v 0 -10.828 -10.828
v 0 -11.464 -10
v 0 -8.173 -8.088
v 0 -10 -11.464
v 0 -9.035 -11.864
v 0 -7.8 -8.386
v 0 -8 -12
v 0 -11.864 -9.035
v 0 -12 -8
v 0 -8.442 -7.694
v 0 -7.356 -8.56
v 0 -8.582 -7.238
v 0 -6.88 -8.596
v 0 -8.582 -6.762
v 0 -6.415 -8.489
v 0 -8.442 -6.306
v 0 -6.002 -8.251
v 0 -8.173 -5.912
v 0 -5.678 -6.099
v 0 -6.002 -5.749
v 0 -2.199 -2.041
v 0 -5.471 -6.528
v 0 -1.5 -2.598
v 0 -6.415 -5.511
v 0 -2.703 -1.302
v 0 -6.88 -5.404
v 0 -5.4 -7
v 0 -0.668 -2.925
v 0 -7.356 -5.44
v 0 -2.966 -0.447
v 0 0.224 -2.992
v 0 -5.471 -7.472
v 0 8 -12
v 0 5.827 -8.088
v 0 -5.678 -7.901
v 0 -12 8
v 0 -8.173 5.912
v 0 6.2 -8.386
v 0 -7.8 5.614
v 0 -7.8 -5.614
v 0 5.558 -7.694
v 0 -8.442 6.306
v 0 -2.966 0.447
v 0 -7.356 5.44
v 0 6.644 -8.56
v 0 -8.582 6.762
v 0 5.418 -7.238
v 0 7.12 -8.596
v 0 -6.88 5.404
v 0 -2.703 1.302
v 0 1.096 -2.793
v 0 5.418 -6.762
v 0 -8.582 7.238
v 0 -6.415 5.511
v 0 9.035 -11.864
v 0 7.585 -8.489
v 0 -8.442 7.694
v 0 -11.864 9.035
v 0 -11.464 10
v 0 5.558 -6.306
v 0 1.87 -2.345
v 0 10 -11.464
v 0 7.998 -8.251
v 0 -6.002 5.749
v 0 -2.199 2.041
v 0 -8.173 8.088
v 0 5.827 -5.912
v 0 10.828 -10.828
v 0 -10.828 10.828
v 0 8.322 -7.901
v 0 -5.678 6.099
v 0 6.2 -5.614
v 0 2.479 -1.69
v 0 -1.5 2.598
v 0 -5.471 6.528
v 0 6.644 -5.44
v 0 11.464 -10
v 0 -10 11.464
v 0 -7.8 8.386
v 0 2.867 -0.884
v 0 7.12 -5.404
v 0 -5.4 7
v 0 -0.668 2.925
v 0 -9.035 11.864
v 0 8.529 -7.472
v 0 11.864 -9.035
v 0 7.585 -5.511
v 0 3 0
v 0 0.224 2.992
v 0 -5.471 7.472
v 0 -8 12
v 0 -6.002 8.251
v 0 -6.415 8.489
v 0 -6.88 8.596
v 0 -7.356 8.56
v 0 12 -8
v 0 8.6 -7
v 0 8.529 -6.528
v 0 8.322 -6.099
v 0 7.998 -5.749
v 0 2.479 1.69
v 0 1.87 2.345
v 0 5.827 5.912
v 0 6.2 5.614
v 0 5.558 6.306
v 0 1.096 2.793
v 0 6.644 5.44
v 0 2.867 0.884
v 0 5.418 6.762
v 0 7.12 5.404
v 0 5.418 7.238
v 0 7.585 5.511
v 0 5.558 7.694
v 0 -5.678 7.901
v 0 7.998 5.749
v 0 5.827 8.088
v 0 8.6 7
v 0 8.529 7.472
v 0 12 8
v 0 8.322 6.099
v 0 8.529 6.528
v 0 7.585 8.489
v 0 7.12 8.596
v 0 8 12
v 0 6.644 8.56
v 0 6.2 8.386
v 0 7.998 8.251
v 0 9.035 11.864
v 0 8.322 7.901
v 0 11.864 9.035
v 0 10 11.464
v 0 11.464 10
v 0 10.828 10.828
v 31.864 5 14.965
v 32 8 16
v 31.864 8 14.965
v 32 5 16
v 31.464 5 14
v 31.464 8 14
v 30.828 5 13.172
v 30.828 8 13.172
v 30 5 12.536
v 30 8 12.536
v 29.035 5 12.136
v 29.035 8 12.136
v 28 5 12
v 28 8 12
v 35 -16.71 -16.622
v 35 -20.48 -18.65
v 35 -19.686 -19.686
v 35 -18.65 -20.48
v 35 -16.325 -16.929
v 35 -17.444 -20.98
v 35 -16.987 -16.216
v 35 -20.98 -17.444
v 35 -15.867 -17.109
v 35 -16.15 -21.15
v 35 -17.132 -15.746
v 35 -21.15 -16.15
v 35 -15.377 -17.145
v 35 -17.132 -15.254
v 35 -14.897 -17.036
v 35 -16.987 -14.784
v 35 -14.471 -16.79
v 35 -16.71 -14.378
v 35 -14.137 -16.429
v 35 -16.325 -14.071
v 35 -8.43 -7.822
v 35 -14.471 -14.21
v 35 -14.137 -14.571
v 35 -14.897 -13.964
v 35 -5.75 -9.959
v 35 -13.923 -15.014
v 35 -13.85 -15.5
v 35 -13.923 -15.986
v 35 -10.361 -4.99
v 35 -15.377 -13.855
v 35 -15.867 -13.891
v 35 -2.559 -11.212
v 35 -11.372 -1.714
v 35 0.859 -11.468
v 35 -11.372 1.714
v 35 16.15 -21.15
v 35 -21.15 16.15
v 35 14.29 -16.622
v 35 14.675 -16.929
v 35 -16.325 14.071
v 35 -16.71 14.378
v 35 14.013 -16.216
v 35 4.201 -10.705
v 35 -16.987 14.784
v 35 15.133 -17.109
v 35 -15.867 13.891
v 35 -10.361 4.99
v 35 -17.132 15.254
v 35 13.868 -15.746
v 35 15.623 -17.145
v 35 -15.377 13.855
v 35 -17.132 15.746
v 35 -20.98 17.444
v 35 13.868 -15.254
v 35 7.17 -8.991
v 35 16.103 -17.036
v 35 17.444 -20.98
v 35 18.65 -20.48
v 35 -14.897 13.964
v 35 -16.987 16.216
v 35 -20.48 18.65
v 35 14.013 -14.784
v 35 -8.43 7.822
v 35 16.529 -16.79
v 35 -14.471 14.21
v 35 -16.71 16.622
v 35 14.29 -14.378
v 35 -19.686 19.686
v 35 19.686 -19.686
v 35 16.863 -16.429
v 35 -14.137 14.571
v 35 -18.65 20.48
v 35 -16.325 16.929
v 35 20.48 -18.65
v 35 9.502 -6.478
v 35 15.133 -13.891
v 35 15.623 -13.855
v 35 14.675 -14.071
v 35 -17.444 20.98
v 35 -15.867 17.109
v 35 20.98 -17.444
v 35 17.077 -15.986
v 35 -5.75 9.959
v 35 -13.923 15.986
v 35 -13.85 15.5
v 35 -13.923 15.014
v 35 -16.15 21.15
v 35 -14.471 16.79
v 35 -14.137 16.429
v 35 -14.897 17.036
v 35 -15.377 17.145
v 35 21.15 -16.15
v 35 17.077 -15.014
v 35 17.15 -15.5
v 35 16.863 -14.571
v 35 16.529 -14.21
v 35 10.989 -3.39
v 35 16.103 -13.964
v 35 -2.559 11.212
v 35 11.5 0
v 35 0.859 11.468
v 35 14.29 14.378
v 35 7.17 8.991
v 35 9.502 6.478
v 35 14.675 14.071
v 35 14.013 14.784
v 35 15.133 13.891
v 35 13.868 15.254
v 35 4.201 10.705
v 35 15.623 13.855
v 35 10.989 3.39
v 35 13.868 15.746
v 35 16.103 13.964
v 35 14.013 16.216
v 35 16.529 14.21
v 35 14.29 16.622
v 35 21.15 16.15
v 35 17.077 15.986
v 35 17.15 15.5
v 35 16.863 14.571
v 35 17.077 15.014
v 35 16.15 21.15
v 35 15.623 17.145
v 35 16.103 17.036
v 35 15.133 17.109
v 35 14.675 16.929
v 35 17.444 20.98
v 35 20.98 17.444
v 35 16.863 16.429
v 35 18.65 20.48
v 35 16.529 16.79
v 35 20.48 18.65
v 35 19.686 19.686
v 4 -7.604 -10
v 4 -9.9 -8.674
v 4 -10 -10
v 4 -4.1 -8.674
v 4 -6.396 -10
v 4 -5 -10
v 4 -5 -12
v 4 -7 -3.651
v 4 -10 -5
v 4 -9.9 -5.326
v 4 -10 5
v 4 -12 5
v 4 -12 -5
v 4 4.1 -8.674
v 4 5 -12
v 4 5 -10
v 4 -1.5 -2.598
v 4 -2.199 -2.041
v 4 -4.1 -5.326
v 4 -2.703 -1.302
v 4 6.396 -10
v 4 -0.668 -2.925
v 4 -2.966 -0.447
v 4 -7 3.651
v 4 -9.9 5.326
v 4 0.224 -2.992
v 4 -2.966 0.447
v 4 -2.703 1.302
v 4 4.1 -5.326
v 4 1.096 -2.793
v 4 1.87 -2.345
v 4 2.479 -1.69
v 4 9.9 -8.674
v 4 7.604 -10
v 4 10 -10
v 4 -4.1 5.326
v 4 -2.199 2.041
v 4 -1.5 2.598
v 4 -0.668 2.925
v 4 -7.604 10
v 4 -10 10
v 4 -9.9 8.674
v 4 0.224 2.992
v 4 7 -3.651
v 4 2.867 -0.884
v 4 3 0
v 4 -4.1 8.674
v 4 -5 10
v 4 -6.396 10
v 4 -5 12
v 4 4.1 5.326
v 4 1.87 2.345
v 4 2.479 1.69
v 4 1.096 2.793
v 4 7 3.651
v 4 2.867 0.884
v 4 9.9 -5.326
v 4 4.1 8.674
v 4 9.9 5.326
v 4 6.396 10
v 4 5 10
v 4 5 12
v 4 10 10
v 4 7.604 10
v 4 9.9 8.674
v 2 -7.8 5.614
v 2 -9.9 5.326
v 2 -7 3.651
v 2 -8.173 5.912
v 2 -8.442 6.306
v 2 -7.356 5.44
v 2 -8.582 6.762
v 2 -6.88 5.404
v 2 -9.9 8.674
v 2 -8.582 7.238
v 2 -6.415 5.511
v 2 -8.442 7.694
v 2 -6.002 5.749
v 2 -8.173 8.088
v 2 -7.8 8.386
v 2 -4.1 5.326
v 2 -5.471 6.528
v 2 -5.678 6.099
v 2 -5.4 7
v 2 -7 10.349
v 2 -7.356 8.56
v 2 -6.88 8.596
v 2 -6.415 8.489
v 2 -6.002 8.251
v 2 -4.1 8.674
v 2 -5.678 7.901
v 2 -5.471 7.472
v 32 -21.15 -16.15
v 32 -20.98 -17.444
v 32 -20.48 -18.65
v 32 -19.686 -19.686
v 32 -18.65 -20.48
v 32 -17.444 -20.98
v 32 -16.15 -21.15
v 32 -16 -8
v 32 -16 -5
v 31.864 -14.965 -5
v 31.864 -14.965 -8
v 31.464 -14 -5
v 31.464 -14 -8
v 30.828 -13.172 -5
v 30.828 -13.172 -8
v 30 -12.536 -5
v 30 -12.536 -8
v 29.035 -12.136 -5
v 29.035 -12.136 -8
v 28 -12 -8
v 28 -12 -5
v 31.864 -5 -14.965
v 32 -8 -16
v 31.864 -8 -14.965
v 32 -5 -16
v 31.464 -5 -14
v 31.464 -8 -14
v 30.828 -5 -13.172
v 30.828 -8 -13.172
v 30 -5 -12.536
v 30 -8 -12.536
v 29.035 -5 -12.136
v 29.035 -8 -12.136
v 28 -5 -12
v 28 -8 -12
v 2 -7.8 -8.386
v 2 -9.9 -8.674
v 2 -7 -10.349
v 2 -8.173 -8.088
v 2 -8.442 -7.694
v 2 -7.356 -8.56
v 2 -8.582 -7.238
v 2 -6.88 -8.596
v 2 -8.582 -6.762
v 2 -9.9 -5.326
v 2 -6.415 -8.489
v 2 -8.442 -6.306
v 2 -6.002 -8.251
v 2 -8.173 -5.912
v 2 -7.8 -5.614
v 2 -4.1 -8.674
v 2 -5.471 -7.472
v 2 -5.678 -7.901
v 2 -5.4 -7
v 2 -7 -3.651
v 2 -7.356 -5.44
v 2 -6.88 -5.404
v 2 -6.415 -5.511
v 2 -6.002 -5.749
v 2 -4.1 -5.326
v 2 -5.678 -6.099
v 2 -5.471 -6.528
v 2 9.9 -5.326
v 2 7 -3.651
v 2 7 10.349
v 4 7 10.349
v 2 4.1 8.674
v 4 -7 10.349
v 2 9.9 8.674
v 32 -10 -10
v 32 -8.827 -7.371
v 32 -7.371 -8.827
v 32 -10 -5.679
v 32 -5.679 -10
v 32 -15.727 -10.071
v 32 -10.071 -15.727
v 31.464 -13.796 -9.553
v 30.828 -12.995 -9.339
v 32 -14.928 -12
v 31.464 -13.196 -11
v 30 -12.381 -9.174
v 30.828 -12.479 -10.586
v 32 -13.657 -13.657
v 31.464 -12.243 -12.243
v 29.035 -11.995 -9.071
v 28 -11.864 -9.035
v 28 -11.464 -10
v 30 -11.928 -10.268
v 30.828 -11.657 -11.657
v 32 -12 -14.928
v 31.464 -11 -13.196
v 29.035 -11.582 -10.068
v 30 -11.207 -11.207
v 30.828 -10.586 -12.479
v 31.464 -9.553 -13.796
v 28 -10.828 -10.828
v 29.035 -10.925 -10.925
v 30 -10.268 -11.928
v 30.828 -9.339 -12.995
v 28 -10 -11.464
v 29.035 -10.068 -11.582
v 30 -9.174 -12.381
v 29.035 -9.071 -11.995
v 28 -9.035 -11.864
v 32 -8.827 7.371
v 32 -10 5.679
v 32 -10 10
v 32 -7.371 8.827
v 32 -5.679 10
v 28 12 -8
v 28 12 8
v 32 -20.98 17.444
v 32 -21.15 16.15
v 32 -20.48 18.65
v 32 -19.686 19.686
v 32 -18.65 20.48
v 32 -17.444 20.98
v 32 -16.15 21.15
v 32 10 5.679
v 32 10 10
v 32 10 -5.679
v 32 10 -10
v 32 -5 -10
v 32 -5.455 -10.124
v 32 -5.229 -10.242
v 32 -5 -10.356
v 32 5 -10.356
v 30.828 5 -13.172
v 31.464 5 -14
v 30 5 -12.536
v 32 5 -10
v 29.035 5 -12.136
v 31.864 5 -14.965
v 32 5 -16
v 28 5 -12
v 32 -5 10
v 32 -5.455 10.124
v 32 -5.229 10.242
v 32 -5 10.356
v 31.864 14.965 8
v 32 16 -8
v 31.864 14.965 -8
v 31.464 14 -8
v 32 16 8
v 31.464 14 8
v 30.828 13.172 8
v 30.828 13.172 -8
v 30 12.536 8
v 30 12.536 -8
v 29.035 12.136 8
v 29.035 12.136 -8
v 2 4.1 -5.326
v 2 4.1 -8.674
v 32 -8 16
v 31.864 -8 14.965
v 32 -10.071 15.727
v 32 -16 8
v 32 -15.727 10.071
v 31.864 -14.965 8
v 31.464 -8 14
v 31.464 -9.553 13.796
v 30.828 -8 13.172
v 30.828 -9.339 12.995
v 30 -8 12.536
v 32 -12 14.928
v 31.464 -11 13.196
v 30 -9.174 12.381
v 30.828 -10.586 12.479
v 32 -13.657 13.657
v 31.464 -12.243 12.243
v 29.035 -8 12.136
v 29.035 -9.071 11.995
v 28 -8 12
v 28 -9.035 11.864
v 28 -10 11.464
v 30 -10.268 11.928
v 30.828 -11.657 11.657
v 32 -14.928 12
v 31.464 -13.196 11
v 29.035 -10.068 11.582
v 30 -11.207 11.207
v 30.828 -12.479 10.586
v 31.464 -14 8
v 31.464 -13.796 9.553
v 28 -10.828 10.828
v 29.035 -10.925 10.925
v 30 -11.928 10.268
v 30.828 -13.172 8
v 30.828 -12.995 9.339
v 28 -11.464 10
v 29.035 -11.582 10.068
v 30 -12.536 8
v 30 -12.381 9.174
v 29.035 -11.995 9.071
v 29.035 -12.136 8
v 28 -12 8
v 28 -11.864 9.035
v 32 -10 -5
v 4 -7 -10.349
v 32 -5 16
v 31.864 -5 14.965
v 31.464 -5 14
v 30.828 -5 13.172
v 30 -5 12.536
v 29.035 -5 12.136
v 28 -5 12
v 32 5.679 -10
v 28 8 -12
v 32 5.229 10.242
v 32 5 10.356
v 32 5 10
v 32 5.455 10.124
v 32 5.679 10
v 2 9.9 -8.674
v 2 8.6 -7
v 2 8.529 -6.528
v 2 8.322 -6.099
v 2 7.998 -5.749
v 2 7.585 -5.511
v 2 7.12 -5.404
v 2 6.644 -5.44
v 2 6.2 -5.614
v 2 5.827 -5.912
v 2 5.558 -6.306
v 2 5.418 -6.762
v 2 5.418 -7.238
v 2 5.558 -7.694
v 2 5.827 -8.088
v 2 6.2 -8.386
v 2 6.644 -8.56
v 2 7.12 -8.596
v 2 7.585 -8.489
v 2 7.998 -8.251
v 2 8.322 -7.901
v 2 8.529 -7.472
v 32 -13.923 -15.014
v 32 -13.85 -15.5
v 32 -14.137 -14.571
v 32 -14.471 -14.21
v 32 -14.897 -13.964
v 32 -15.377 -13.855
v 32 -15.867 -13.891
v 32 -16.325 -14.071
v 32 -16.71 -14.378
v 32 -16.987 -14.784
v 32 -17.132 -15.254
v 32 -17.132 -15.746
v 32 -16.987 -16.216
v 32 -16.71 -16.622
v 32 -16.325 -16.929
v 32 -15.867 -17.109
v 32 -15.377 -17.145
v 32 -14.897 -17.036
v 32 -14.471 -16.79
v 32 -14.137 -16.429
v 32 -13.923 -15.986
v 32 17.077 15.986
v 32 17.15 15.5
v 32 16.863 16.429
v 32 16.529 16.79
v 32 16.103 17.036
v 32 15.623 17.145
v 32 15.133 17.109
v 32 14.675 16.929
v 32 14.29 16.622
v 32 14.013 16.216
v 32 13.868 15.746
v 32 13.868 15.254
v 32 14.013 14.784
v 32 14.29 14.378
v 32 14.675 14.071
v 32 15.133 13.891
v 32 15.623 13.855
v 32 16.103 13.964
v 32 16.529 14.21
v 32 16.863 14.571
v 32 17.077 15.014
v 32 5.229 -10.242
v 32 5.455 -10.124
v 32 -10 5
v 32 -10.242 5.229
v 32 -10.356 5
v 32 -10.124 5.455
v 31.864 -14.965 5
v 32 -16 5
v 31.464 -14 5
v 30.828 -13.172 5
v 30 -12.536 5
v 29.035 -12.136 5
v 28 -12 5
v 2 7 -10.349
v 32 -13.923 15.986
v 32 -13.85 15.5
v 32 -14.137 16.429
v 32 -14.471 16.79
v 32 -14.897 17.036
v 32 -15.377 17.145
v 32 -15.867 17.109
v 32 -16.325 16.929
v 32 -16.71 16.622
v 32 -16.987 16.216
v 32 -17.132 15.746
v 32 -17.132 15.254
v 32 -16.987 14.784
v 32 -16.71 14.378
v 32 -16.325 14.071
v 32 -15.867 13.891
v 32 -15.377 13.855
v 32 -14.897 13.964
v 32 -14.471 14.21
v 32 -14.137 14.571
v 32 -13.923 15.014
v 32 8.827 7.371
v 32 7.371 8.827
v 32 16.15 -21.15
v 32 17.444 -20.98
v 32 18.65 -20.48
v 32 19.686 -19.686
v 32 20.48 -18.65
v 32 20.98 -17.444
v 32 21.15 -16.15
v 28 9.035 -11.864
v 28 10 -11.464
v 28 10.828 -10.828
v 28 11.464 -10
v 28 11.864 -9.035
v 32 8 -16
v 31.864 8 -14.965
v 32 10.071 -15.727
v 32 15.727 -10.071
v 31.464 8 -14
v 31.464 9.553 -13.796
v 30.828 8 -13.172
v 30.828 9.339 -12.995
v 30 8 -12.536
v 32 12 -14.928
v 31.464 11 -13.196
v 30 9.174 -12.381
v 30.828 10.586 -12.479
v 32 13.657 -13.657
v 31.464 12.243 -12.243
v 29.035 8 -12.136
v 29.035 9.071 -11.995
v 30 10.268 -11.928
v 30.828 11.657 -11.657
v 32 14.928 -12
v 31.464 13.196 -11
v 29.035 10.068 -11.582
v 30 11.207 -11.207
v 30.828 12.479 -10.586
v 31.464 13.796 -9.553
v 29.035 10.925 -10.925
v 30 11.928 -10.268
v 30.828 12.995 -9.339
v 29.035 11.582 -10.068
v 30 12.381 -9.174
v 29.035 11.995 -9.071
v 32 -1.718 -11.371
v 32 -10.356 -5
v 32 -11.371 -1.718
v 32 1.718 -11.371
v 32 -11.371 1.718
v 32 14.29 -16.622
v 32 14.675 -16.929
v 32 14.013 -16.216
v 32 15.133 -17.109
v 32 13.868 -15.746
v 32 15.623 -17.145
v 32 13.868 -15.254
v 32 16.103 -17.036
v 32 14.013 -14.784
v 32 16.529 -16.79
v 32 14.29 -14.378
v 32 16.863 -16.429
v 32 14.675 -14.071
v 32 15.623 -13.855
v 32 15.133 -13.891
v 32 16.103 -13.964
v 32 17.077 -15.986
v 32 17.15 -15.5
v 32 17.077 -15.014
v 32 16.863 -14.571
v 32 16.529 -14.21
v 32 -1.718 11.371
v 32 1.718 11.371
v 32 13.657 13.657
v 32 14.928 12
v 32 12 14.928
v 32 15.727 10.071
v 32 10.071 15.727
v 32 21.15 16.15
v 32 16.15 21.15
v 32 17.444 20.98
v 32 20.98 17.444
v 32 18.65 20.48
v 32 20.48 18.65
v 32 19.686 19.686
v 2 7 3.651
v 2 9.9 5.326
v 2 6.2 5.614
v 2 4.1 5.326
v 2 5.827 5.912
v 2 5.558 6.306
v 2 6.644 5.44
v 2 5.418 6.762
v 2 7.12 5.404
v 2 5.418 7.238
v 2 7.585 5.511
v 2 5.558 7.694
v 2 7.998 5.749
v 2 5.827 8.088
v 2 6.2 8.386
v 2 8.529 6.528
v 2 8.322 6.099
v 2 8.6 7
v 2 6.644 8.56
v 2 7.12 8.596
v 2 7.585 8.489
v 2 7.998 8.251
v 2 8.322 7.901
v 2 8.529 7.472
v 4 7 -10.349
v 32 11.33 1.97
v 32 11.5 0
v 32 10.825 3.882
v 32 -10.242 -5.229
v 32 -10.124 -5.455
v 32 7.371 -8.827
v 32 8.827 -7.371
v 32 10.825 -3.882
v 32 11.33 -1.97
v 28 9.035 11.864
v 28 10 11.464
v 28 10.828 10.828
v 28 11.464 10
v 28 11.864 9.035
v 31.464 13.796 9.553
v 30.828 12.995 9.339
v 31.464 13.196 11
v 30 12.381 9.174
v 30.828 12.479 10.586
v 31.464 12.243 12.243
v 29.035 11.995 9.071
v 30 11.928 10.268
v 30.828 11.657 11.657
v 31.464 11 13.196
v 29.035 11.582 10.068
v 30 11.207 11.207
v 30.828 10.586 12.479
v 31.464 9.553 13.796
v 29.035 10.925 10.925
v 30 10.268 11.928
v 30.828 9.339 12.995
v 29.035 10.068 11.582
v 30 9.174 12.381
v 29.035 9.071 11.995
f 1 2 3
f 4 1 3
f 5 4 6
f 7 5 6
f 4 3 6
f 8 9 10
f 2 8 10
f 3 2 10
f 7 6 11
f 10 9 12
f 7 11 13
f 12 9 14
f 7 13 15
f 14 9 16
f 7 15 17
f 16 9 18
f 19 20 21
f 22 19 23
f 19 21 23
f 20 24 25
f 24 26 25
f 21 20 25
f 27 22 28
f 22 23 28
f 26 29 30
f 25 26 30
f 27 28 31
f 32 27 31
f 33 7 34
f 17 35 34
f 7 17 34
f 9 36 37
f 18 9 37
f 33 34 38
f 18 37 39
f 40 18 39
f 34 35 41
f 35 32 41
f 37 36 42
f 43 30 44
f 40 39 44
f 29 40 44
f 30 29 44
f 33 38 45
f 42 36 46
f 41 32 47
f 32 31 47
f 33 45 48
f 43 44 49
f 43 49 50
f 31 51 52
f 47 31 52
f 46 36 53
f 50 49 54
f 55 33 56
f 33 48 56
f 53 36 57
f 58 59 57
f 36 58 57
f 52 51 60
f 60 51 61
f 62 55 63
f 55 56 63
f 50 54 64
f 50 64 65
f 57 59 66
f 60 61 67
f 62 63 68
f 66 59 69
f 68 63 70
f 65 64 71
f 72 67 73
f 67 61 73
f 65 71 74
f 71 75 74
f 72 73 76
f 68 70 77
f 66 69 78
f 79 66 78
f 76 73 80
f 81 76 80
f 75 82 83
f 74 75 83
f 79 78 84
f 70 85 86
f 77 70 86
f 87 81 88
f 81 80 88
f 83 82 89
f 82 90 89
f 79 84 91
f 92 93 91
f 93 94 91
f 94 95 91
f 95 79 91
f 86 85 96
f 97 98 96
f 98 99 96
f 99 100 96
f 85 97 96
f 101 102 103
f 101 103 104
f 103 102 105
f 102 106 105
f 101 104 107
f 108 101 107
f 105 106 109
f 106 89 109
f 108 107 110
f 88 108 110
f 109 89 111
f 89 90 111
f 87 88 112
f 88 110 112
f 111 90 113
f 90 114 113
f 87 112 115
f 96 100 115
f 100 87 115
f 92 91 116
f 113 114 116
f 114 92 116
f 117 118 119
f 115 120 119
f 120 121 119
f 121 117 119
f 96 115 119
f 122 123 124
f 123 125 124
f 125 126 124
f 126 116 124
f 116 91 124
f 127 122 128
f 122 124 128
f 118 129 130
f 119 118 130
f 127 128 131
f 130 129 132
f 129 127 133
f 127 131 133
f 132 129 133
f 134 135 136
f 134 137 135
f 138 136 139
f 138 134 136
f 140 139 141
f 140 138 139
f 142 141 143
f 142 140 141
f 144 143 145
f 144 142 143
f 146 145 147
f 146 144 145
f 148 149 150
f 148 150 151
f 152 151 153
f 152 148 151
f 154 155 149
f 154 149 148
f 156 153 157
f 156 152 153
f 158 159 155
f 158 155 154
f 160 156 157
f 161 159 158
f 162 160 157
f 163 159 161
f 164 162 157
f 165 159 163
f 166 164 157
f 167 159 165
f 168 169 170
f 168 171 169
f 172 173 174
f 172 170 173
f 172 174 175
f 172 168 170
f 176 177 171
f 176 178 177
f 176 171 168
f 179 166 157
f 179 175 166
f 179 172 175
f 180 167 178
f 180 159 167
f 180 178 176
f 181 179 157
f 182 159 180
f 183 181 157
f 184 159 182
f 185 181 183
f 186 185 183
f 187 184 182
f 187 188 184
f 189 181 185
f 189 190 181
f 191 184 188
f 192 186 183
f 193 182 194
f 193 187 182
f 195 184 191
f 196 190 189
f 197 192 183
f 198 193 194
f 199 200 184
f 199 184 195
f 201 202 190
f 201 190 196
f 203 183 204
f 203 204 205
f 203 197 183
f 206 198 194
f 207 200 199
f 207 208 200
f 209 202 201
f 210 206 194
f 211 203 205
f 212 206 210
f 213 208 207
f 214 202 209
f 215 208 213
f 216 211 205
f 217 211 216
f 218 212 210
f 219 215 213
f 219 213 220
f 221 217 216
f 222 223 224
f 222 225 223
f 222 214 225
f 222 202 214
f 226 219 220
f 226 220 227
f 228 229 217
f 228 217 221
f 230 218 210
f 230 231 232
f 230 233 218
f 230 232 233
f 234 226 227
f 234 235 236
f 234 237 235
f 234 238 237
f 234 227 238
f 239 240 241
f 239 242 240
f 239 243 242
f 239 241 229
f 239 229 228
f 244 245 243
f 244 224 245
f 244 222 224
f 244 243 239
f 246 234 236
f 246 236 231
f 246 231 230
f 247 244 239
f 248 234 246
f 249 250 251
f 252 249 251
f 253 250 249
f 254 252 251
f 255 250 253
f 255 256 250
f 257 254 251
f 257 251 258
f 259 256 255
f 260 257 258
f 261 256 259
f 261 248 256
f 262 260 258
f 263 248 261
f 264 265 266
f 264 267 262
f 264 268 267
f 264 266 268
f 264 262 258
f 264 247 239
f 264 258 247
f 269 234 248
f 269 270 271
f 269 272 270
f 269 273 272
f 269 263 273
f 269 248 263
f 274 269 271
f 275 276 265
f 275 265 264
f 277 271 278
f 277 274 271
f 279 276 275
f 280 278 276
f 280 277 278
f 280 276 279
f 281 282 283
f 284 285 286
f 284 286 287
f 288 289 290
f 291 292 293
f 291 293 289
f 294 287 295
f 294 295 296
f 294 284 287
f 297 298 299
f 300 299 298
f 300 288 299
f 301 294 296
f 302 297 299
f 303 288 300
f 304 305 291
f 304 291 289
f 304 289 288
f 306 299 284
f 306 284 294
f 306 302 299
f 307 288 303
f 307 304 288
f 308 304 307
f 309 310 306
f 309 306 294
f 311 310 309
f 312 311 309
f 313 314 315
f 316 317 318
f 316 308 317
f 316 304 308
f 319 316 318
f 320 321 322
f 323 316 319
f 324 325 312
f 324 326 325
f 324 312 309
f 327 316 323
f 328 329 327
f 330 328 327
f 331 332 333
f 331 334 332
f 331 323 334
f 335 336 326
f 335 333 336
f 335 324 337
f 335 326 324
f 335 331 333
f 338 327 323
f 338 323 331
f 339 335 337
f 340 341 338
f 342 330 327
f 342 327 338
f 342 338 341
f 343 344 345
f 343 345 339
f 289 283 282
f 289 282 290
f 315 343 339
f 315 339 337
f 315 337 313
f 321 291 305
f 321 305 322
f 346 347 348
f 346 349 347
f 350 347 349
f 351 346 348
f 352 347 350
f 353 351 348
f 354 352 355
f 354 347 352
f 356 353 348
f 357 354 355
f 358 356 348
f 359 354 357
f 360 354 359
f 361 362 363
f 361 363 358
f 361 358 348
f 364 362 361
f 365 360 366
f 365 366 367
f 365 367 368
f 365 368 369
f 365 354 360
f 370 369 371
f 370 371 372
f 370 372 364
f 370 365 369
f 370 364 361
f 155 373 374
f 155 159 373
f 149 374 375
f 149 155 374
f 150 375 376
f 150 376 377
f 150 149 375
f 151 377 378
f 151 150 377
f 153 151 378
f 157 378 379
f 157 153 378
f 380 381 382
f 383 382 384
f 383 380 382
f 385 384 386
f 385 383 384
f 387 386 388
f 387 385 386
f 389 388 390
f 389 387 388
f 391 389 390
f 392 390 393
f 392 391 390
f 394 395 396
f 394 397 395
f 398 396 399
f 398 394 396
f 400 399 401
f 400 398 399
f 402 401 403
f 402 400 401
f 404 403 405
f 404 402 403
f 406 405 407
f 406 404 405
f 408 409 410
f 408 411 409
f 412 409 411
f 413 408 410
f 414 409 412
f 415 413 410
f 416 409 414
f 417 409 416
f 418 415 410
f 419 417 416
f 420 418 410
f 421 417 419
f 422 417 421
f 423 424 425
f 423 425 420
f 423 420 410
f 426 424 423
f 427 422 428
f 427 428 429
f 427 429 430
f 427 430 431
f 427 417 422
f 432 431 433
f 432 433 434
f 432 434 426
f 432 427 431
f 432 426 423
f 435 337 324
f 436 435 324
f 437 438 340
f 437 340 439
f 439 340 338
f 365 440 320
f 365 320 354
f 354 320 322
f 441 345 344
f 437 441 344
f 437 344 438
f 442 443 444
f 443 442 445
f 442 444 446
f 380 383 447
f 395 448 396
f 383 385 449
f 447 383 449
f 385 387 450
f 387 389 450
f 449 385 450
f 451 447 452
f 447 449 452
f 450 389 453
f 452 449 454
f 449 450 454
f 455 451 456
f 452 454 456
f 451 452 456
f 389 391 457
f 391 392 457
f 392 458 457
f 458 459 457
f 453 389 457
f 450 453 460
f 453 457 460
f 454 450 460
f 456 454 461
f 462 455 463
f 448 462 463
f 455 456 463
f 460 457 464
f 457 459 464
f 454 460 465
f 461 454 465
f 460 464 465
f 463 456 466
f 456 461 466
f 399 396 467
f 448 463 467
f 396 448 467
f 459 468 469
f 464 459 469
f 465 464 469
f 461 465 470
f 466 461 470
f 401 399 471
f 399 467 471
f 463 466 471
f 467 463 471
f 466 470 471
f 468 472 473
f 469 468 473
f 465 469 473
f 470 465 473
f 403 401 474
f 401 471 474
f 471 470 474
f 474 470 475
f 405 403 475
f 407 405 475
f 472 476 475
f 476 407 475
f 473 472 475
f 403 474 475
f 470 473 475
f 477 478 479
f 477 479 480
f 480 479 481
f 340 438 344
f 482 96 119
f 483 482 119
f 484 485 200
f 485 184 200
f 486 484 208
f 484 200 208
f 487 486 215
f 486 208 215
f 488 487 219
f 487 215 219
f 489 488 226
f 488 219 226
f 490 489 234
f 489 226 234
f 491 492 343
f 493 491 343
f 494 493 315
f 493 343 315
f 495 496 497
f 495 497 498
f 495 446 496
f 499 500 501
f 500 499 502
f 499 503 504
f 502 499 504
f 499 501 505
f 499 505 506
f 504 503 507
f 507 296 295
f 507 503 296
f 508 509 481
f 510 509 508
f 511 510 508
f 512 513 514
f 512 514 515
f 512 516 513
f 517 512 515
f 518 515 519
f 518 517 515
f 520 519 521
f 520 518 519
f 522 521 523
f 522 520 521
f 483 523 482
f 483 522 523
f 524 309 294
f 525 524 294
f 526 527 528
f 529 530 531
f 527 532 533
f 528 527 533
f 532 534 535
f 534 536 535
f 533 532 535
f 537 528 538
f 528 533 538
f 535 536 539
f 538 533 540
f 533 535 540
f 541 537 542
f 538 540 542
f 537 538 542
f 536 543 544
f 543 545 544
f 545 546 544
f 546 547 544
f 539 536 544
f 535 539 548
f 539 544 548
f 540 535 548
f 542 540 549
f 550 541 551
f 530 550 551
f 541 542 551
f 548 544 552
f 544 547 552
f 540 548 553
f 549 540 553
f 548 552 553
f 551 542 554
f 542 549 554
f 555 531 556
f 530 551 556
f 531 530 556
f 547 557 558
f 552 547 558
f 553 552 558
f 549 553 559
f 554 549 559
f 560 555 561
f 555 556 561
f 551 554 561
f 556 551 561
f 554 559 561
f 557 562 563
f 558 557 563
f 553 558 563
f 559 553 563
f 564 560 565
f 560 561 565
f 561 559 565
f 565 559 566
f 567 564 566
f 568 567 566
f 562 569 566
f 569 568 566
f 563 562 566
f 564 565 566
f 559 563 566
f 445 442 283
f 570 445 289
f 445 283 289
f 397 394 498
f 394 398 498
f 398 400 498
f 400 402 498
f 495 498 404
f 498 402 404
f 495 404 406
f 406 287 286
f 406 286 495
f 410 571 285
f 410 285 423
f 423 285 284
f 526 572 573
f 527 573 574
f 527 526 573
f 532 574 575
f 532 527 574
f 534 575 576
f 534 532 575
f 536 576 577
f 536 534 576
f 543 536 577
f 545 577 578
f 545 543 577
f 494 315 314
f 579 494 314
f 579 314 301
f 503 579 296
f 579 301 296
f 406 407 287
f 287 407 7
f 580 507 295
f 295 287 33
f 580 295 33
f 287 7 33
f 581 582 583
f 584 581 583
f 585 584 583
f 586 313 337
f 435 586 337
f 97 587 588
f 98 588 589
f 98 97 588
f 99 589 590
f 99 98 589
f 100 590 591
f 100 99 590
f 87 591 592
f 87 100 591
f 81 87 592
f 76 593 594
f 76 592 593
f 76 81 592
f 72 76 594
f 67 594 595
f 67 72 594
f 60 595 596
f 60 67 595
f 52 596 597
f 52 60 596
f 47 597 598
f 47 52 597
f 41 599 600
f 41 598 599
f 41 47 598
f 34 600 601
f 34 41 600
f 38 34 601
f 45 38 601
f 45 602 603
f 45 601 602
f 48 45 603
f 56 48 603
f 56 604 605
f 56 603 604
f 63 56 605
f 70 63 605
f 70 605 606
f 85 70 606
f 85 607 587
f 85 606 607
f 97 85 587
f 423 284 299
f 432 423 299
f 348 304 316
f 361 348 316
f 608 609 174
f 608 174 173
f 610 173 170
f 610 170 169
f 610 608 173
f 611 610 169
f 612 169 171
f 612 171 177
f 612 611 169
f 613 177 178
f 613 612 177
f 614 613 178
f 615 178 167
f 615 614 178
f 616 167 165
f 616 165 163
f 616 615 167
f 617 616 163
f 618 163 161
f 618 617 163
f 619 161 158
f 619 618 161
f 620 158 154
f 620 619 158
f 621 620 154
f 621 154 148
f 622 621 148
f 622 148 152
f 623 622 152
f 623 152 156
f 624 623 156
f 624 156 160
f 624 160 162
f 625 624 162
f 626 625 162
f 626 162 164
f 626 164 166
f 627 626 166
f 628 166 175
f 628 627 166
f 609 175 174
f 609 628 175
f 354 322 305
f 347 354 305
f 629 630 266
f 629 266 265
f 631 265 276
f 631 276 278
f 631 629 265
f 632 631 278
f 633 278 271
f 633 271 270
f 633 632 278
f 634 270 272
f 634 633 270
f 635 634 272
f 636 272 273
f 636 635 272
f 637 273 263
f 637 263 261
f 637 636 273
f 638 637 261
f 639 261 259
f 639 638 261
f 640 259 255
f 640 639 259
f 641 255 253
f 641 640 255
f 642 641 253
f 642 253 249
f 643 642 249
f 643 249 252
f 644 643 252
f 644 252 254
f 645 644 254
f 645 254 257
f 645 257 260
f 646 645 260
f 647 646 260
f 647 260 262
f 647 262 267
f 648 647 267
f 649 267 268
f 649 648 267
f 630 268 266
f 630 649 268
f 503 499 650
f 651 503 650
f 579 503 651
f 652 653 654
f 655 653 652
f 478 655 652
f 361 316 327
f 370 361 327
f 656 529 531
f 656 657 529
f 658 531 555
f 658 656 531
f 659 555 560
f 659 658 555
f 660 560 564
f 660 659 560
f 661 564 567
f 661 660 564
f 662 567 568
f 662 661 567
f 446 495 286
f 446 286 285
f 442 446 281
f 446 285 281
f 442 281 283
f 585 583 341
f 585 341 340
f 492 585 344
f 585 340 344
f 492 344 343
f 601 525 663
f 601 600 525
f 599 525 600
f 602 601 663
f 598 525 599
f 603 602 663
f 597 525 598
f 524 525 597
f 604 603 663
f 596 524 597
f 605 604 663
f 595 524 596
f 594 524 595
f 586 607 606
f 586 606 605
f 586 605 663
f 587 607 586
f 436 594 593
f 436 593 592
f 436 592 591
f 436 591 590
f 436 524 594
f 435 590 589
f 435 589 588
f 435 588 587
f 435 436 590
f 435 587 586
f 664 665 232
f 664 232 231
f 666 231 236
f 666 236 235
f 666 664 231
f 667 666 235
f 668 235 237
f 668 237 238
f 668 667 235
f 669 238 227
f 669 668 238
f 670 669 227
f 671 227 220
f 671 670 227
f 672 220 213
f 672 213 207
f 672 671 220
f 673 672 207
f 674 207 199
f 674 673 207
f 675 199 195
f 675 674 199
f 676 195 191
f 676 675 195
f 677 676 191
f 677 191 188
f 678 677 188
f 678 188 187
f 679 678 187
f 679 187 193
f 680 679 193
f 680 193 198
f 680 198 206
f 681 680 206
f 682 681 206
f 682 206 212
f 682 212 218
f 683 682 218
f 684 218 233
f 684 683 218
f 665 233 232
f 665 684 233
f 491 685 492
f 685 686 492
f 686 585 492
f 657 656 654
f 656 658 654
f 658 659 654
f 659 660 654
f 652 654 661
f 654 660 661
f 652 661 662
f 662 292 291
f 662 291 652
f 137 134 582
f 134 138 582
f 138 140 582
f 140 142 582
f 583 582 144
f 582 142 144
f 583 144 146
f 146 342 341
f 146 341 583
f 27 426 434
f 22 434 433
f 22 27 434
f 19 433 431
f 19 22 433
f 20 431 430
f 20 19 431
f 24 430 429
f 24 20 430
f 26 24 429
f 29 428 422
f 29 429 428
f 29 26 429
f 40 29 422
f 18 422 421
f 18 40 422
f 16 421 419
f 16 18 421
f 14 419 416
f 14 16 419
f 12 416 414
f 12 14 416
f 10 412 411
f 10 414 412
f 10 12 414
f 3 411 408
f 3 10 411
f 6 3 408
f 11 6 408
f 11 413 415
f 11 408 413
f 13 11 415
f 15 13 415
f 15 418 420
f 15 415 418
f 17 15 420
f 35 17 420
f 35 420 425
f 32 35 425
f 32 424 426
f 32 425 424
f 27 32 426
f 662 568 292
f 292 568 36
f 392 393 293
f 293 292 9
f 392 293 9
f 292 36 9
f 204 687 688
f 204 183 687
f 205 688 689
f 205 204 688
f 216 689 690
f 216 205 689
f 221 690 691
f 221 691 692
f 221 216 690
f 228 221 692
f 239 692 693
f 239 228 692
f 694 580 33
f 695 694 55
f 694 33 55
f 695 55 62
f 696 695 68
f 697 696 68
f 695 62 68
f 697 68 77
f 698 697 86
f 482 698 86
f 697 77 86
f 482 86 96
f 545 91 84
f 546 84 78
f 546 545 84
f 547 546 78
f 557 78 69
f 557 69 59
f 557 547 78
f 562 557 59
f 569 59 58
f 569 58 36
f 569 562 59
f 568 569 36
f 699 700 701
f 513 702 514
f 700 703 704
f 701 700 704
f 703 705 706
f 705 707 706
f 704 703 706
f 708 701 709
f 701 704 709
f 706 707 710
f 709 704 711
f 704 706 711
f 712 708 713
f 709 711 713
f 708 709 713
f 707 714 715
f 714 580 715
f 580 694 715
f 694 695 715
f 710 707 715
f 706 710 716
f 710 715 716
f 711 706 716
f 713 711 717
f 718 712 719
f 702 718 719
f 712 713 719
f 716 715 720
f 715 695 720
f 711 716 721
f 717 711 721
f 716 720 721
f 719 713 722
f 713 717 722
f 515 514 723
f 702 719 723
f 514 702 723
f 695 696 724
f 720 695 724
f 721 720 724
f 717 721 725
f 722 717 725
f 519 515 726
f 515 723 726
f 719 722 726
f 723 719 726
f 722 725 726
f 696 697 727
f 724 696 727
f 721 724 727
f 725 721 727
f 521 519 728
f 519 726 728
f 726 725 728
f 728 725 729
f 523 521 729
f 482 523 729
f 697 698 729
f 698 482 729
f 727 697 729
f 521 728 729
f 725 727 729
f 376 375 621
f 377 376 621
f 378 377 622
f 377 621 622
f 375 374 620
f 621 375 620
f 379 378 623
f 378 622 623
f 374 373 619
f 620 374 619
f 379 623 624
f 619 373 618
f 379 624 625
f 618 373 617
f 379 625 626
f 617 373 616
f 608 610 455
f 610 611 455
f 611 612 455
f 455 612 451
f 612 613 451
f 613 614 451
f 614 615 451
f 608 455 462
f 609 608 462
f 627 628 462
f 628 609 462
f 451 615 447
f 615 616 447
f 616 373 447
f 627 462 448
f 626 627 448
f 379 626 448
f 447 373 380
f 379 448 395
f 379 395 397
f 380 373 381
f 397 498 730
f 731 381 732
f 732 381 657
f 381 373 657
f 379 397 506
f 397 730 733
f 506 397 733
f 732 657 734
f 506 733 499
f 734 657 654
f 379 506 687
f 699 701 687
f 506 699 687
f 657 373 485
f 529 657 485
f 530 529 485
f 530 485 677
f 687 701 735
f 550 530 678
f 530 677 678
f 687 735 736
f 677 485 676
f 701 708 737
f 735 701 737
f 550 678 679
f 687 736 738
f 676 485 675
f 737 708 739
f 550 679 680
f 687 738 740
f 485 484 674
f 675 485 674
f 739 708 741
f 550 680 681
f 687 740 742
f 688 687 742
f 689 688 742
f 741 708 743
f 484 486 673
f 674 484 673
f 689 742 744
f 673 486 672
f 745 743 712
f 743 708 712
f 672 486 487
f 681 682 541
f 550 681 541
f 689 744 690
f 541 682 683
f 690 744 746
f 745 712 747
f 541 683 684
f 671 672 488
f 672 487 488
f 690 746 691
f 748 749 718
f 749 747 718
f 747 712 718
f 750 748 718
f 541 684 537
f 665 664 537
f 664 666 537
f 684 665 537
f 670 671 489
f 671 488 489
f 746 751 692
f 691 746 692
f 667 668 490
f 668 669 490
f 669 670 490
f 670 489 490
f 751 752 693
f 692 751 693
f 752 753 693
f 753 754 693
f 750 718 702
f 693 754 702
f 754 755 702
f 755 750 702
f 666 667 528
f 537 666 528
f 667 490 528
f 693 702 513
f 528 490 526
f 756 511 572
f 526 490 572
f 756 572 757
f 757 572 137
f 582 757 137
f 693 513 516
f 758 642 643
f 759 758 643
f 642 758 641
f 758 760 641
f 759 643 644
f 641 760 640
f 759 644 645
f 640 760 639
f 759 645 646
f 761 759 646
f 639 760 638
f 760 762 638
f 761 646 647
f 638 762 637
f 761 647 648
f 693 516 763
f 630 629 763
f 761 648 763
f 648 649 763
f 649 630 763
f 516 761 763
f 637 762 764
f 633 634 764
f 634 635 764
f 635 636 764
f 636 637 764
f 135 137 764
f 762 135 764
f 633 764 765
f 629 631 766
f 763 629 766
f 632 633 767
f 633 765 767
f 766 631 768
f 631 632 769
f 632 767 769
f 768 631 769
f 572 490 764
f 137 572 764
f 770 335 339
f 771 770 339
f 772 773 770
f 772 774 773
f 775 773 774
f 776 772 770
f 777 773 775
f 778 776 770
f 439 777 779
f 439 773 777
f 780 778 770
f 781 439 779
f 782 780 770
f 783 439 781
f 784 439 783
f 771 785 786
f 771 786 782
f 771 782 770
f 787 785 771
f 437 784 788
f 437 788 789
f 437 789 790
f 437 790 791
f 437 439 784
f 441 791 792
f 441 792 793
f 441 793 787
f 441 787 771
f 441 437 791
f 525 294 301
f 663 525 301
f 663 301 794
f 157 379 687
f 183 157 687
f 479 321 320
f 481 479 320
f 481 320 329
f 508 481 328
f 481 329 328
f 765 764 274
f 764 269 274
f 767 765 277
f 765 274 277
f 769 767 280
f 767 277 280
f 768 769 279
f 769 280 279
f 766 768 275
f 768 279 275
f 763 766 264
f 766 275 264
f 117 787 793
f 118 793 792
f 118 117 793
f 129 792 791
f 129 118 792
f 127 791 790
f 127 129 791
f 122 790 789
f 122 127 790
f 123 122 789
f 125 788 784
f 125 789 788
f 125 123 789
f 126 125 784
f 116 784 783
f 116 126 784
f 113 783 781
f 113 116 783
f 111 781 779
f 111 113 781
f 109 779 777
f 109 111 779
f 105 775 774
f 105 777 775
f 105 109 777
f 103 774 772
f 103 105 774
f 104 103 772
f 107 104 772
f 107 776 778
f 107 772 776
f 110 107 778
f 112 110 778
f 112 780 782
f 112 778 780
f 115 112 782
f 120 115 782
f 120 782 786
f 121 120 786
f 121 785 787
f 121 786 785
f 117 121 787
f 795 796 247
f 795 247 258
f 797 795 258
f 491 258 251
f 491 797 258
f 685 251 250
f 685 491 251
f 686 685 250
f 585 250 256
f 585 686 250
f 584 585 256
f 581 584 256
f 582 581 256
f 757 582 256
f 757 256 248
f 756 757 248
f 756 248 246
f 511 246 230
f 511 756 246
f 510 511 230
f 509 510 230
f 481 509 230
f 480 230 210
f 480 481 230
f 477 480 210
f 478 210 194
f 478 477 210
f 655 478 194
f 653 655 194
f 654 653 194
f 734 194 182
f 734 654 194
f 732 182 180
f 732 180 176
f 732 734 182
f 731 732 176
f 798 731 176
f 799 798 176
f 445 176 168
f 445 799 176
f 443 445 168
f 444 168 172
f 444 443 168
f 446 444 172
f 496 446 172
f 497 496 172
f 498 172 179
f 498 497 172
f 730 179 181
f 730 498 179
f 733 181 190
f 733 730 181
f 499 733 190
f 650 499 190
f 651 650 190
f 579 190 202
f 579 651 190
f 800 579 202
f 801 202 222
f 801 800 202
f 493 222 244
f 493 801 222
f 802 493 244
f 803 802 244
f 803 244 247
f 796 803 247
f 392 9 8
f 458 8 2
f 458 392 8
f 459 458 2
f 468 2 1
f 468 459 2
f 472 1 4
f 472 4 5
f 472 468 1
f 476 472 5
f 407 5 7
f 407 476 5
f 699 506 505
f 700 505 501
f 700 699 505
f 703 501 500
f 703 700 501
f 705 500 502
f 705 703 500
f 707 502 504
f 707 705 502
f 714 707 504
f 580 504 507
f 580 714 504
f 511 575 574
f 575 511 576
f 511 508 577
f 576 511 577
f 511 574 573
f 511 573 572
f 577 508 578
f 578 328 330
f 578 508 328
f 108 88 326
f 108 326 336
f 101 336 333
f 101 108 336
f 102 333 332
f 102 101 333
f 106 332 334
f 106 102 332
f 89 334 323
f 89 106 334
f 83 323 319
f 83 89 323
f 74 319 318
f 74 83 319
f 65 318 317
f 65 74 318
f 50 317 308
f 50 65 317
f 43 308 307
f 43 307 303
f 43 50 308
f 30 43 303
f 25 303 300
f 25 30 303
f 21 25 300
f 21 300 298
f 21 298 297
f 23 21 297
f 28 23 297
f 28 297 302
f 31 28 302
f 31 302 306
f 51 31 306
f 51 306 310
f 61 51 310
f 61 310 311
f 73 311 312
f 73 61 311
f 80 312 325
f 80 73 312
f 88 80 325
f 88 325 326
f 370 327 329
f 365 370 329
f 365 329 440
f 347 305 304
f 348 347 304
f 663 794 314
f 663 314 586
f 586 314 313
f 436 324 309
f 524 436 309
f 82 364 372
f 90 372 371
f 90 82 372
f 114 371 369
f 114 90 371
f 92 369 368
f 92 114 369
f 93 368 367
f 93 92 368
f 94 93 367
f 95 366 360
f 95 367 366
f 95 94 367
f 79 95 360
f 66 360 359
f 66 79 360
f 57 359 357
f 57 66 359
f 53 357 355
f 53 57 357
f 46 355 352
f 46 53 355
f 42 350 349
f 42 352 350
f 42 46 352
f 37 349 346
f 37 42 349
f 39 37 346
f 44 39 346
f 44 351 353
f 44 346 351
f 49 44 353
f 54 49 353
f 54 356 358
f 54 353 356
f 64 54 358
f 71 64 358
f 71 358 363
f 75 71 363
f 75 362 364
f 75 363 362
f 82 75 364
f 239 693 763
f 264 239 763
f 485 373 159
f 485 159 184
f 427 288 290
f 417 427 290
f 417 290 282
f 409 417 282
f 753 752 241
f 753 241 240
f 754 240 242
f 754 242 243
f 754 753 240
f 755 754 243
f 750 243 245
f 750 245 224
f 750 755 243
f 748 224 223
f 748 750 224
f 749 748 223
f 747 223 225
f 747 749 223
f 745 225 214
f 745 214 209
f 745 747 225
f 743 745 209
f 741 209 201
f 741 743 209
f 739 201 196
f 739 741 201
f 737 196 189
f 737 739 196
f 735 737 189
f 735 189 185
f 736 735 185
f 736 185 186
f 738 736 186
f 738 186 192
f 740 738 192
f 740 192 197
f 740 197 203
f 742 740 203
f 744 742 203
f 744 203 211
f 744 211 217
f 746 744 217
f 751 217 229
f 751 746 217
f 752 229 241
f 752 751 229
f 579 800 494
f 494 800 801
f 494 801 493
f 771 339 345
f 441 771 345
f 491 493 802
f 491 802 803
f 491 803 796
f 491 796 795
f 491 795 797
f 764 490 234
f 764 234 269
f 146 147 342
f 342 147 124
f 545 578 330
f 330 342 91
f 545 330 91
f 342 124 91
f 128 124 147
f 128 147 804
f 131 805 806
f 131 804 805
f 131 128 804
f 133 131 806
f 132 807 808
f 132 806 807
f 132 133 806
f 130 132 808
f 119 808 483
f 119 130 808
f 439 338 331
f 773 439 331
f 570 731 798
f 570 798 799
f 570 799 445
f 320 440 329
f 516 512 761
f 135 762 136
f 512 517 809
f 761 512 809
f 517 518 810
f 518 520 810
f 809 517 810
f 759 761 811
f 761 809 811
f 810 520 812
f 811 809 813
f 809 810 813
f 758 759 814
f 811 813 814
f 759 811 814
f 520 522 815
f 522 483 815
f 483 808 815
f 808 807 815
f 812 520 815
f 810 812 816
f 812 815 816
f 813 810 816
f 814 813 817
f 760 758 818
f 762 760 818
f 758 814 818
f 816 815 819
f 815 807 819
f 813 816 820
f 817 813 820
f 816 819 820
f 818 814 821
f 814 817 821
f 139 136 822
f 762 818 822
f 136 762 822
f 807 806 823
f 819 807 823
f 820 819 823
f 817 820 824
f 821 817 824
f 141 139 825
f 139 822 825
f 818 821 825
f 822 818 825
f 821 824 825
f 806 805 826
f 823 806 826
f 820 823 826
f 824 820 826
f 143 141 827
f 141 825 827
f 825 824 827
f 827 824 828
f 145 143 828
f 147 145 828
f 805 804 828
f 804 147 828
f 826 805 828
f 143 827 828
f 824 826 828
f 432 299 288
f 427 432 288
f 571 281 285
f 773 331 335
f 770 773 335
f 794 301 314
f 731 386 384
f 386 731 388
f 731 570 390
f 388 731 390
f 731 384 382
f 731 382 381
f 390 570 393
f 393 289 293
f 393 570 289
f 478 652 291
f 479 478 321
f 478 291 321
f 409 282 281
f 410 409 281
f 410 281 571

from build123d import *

# Parameters (mm, degrees)
F0_W     = 24
F0_H     = 24
F0_R     = 1.6
F0_R_2   = 3
F1_DEPTH = 4
F4_DEPTH = 2
F5_DEPTH = 28
F6_W     = 42.3
F6_H     = 42.3
F6_R     = 1.65
F6_R_2   = 11.5
F7_DEPTH = 3
F8_R     = 5
F9_F1_R  = 4
F9_F2_R  = 4


with BuildPart() as f1:
    # F0 (on Right) → F1 (new body)
    with BuildSketch(Plane.YZ):
        Rectangle(F0_W, F0_H)
        with Locations((-7, -7)):
            Circle(F0_R, mode=Mode.SUBTRACT)
        with Locations((7, -7)):
            Circle(F0_R, mode=Mode.SUBTRACT)
        with Locations((-7, 7)):
            Circle(F0_R, mode=Mode.SUBTRACT)
        Circle(F0_R_2, mode=Mode.SUBTRACT)
        with Locations((7, 7)):
            Circle(F0_R, mode=Mode.SUBTRACT)
    extrude(amount=F1_DEPTH)

    # F2 (on face) → F4 (cut)
    with BuildSketch(Plane.YZ.offset(4)):
        Polygon((7, -3.6513684387), (4.1, -5.3256842194), (4.1, -8.6743157806), (7, -10.3486315613), (9.9, -8.6743157806), (9.9, -5.3256842194), align=None)
        Polygon((4.1, 5.3256842194), (7, 3.6513684387), (9.9, 5.3256842194), (9.9, 8.6743157806), (7, 10.3486315613), (4.1, 8.6743157806), align=None)
        Polygon((-9.9, 5.3256842194), (-7, 3.6513684387), (-4.1, 5.3256842194), (-4.1, 8.6743157806), (-7, 10.3486315613), (-9.9, 8.6743157806), align=None)
        Polygon((-4.1, -5.3256842194), (-7, -3.6513684387), (-9.9, -5.3256842194), (-9.9, -8.6743157806), (-7, -10.3486315613), (-4.1, -8.6743157806), align=None)
    extrude(amount=-F4_DEPTH, mode=Mode.SUBTRACT)

    # F3 (on face) → F5 (join)
    with BuildSketch(Plane.YZ.offset(4)):
        Polygon((-5, 12), (-12, 12), (-12, 5), (-10, 5), (-10, 10), (-5, 10), align=None)
        Polygon((12, 12), (5, 12), (5, 10), (10, 10), (10, -10), (5, -10), (5, -12), (12, -12), align=None)
        Polygon((-10, -5), (-12, -5), (-12, -12), (-5, -12), (-5, -10), (-10, -10), align=None)
    extrude(amount=F5_DEPTH)

    # F6 (on face) → F7 (join)
    with BuildSketch(Plane.YZ.offset(32)):
        Rectangle(F6_W, F6_H)
        with Locations((-15.5, -15.5)):
            Circle(F6_R, mode=Mode.SUBTRACT)
        with Locations((15.5, -15.5)):
            Circle(F6_R, mode=Mode.SUBTRACT)
        with Locations((-15.5, 15.5)):
            Circle(F6_R, mode=Mode.SUBTRACT)
        Circle(F6_R_2, mode=Mode.SUBTRACT)
        with Locations((15.5, 15.5)):
            Circle(F6_R, mode=Mode.SUBTRACT)
    extrude(amount=F7_DEPTH)

    # F8
    f8_edges = [f1.edges().sort_by_distance(p)[0] for p in [
        (33.5, 21.15, 21.15),
        (33.5, 21.15, -21.15),
        (33.5, -21.15, -21.15),
        (33.5, -21.15, 21.15),
    ]]
    fillet(f8_edges, radius=F8_R)

    # F9: fillet of radius 4 on 7 edges, made by hand

    # F9_f1
    f9_f1_edges = [f1.edges().sort_by_distance(p)[0] for p in [
        (16, 12, 12),
        (16, 12, -12),
        (16, -12, -12),
        (16, -12, 12),
    ]]
    fillet(f9_f1_edges, radius=F9_F1_R)

    # F9_f2
    f9_f2_edges = [f1.edges().sort_by_distance(p)[0] for p in [
        (32, 12, 0),
        (32, -6.5, -12),
        (32, -12, 6.5),
        (32, -10.8284271247, 10.8284271247),
        (32, -10.8284271247, -10.8284271247),
        (32, 10.8284271247, -10.8284271247),
        (32, 10.8284271247, 10.8284271247),
    ]]
    fillet(f9_f2_edges, radius=F9_F2_R)


solid = f1.part
